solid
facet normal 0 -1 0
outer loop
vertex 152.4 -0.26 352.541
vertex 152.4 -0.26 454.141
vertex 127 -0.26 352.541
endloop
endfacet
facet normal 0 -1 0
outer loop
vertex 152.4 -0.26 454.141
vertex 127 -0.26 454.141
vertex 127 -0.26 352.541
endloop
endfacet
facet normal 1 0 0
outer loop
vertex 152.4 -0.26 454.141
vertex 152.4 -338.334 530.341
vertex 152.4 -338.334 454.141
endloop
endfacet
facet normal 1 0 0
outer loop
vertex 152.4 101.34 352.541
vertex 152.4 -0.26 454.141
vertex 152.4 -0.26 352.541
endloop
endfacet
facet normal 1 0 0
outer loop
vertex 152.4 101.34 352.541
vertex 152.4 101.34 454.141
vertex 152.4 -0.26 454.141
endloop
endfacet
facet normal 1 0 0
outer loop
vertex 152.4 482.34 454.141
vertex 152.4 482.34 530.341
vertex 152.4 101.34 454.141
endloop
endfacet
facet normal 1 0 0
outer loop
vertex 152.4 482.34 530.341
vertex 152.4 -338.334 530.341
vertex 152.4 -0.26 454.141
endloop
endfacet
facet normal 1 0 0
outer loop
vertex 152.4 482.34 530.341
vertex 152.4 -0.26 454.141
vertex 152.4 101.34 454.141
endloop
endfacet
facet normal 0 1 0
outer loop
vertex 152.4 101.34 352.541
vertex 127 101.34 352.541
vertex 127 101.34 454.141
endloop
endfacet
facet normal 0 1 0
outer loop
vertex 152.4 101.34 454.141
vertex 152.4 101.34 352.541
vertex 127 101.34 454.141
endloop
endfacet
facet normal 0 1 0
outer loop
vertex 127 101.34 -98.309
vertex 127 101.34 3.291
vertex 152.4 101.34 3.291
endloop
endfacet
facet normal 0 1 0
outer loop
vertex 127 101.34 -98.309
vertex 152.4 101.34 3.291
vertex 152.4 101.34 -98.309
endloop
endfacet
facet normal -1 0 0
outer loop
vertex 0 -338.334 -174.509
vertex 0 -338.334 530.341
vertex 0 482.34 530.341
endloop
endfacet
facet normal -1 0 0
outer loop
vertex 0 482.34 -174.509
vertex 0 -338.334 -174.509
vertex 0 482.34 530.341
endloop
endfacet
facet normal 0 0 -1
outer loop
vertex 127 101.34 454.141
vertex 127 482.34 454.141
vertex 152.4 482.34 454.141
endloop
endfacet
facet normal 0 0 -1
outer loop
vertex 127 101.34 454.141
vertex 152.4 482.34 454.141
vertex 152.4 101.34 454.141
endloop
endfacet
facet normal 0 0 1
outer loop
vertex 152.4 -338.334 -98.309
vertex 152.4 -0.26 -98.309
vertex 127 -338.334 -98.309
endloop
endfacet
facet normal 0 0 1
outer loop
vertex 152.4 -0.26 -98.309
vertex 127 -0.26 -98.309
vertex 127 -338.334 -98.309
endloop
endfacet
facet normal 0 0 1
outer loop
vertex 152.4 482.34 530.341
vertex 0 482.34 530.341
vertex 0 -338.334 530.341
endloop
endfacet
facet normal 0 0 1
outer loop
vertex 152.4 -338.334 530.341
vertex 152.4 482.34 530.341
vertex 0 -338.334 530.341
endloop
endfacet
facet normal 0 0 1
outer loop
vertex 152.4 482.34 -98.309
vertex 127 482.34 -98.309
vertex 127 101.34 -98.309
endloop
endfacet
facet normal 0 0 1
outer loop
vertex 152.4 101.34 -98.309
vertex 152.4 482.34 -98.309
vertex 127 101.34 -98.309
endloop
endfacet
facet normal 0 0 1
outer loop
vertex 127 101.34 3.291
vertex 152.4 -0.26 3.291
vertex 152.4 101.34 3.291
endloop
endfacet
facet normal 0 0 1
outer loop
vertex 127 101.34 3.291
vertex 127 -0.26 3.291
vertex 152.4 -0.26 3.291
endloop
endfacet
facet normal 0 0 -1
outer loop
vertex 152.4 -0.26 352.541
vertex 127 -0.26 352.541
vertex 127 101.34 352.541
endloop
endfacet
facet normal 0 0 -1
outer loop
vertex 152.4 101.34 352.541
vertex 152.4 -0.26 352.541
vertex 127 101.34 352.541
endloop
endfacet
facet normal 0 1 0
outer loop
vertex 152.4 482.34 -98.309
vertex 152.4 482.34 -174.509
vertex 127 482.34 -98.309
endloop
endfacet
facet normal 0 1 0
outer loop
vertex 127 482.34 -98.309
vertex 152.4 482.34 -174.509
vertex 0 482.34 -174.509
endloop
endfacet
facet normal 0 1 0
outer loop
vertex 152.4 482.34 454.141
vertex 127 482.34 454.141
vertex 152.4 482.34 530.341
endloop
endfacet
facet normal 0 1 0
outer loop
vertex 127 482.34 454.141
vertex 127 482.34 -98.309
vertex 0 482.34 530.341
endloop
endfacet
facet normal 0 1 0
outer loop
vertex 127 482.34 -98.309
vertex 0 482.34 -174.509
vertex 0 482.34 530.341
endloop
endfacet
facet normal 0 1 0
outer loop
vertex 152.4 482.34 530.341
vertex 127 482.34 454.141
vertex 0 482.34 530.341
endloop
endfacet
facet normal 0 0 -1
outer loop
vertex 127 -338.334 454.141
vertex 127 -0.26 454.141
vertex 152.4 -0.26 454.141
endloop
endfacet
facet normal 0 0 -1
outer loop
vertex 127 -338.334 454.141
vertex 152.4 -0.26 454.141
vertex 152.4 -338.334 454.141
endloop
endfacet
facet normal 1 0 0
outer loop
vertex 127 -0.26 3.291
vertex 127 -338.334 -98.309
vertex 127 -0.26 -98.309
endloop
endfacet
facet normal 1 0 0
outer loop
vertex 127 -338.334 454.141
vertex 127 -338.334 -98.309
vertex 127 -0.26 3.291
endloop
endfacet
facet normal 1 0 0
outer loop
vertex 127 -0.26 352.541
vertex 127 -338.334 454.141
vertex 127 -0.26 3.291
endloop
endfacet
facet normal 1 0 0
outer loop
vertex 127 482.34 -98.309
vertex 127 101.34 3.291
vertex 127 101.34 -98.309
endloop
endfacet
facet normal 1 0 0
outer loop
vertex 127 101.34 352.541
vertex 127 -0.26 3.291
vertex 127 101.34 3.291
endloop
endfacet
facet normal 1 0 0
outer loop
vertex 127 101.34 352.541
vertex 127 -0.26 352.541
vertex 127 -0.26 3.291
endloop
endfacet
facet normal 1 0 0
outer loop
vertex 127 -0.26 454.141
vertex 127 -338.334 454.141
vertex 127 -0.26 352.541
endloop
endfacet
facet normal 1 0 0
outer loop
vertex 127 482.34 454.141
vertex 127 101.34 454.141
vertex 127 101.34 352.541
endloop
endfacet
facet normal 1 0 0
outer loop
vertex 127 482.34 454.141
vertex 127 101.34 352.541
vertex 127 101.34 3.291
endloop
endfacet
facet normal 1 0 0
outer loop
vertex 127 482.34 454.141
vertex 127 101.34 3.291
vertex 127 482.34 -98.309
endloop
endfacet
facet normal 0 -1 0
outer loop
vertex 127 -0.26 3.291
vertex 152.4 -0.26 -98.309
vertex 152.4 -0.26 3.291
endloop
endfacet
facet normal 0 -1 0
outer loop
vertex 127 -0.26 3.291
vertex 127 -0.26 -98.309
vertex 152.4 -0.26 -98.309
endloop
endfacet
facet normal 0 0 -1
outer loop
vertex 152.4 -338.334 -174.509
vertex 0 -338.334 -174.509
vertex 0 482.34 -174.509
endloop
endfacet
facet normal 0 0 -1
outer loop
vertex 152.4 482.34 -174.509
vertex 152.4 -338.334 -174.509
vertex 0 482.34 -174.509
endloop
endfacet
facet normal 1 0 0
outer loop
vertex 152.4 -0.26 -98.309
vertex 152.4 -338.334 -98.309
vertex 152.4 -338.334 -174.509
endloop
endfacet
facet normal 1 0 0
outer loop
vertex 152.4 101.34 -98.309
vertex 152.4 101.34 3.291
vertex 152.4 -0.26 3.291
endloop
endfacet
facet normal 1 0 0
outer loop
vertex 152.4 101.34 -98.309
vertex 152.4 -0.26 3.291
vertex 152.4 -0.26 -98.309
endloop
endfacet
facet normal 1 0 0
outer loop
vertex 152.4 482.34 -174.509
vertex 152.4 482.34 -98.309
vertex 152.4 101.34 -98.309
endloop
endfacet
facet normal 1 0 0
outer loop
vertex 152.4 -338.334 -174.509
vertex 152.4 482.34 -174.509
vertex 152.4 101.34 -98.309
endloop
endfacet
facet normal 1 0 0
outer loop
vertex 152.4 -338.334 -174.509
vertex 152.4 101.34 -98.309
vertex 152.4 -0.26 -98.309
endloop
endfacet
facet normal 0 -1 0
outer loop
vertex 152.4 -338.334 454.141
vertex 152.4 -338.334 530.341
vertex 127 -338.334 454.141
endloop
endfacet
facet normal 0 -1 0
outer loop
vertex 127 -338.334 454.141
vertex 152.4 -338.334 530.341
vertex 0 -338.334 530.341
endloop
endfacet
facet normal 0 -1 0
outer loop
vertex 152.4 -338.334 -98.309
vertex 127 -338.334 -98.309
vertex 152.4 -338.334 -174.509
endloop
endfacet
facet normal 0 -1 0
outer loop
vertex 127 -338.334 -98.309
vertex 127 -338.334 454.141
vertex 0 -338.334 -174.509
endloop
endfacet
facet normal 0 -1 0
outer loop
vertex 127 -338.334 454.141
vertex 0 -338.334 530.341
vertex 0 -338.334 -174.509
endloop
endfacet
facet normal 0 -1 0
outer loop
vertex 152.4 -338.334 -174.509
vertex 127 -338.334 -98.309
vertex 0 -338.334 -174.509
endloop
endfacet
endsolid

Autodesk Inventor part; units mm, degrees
ref_plane "YZ Plane" through (0, 0, 0) normal (1, 0, 0) x (0, 1, 0)
ref_plane "XZ Plane" through (0, 0, 0) normal (0, 1, 0) x (-1, 0, 0)
ref_plane "XY Plane" through (0, 0, 0) normal (0, 0, 1) x (1, 0, 0)
sketch "Sketch1" plane through (0, 0, 0) normal (1, 0, 0) x (0, 1, 0)
  line L0 (482.3395, 530.3412) -> (-338.3345, 530.3412)
  line L1 (-338.3345, 530.3412) -> (-338.3345, -174.5088)
  line L2 (-338.3345, -174.5088) -> (482.3395, -174.5088)
  line L3 (482.3395, -174.5088) -> (482.3395, 530.3412)
  point P0 (0, 0)
  dimension "d0" = 820.674
  dimension "d1" = 704.85
extrude "Extrusion1" add sketch "Sketch1" along normal blind 127
sketch "Sketch2" plane through (127, 0, 0) normal (1, 0, 0) x (0, 0, -1)
  line L0 (174.5088, 482.3395) -> (-530.3412, 482.3395) projected
  line L1 (-530.3412, -338.3345) -> (174.5088, -338.3345) projected
  line L2 (-530.3412, 482.3395) -> (-454.1412, 482.3395)
  line L3 (-454.1412, 482.3395) -> (-454.1412, -338.3345)
  line L4 (-454.1412, -338.3345) -> (-530.3412, -338.3345)
  line L5 (-530.3412, -338.3345) -> (-530.3412, 482.3395)
  line L6 (174.5088, 482.3395) -> (98.3088, 482.3395)
  line L7 (98.3088, 482.3395) -> (98.3088, -338.3345)
  line L8 (98.3088, -338.3345) -> (174.5088, -338.3345)
  line L9 (174.5088, -338.3345) -> (174.5088, 482.3395)
  line L10 (174.5088, -338.3345) -> (174.5088, 482.3395) projected
  point P0 (0, 0)
  dimension "d4" = 76.2
  dimension "d5" = 76.2
  dimension "d6" = 0
extrude "Extrusion2" add sketch "Sketch2" along normal blind 25.4 contours L9 L1 L7 L0 | L3 L1 L5 L0
sketch "Sketch3" plane through (127, 0, 0) normal (1, 0, 0) x (0, 0, -1)
  line L0 (-454.1412, 482.3395) -> (-454.1412, -338.3345) projected
  line L1 (-352.5412, 101.3395) -> (-454.1412, 101.3395)
  line L2 (-454.1412, 101.3395) -> (-454.1412, -0.2605)
  line L3 (-454.1412, -0.2605) -> (-352.5412, -0.2605)
  line L4 (-352.5412, -0.2605) -> (-352.5412, 101.3395)
  line L5 (98.3088, -338.3345) -> (98.3088, 482.3395) projected
  line L6 (-3.2912, 101.3395) -> (98.3088, 101.3395)
  line L7 (98.3088, 101.3395) -> (98.3088, -0.2605)
  line L8 (98.3088, -0.2605) -> (-3.2912, -0.2605)
  line L9 (-3.2912, -0.2605) -> (-3.2912, 101.3395)
  line L10 (98.3088, 482.3395) -> (-454.1412, 482.3395) projected
  point P0 (0, 0)
  dimension "d9" = 101.6
  dimension "d10" = 101.6
  dimension "d11" = 101.6
  dimension "d12" = 101.6
  dimension "d13" = 381
extrude "Extrusion3" add sketch "Sketch3" along normal blind 25.4
properties part number "BlockBase"
